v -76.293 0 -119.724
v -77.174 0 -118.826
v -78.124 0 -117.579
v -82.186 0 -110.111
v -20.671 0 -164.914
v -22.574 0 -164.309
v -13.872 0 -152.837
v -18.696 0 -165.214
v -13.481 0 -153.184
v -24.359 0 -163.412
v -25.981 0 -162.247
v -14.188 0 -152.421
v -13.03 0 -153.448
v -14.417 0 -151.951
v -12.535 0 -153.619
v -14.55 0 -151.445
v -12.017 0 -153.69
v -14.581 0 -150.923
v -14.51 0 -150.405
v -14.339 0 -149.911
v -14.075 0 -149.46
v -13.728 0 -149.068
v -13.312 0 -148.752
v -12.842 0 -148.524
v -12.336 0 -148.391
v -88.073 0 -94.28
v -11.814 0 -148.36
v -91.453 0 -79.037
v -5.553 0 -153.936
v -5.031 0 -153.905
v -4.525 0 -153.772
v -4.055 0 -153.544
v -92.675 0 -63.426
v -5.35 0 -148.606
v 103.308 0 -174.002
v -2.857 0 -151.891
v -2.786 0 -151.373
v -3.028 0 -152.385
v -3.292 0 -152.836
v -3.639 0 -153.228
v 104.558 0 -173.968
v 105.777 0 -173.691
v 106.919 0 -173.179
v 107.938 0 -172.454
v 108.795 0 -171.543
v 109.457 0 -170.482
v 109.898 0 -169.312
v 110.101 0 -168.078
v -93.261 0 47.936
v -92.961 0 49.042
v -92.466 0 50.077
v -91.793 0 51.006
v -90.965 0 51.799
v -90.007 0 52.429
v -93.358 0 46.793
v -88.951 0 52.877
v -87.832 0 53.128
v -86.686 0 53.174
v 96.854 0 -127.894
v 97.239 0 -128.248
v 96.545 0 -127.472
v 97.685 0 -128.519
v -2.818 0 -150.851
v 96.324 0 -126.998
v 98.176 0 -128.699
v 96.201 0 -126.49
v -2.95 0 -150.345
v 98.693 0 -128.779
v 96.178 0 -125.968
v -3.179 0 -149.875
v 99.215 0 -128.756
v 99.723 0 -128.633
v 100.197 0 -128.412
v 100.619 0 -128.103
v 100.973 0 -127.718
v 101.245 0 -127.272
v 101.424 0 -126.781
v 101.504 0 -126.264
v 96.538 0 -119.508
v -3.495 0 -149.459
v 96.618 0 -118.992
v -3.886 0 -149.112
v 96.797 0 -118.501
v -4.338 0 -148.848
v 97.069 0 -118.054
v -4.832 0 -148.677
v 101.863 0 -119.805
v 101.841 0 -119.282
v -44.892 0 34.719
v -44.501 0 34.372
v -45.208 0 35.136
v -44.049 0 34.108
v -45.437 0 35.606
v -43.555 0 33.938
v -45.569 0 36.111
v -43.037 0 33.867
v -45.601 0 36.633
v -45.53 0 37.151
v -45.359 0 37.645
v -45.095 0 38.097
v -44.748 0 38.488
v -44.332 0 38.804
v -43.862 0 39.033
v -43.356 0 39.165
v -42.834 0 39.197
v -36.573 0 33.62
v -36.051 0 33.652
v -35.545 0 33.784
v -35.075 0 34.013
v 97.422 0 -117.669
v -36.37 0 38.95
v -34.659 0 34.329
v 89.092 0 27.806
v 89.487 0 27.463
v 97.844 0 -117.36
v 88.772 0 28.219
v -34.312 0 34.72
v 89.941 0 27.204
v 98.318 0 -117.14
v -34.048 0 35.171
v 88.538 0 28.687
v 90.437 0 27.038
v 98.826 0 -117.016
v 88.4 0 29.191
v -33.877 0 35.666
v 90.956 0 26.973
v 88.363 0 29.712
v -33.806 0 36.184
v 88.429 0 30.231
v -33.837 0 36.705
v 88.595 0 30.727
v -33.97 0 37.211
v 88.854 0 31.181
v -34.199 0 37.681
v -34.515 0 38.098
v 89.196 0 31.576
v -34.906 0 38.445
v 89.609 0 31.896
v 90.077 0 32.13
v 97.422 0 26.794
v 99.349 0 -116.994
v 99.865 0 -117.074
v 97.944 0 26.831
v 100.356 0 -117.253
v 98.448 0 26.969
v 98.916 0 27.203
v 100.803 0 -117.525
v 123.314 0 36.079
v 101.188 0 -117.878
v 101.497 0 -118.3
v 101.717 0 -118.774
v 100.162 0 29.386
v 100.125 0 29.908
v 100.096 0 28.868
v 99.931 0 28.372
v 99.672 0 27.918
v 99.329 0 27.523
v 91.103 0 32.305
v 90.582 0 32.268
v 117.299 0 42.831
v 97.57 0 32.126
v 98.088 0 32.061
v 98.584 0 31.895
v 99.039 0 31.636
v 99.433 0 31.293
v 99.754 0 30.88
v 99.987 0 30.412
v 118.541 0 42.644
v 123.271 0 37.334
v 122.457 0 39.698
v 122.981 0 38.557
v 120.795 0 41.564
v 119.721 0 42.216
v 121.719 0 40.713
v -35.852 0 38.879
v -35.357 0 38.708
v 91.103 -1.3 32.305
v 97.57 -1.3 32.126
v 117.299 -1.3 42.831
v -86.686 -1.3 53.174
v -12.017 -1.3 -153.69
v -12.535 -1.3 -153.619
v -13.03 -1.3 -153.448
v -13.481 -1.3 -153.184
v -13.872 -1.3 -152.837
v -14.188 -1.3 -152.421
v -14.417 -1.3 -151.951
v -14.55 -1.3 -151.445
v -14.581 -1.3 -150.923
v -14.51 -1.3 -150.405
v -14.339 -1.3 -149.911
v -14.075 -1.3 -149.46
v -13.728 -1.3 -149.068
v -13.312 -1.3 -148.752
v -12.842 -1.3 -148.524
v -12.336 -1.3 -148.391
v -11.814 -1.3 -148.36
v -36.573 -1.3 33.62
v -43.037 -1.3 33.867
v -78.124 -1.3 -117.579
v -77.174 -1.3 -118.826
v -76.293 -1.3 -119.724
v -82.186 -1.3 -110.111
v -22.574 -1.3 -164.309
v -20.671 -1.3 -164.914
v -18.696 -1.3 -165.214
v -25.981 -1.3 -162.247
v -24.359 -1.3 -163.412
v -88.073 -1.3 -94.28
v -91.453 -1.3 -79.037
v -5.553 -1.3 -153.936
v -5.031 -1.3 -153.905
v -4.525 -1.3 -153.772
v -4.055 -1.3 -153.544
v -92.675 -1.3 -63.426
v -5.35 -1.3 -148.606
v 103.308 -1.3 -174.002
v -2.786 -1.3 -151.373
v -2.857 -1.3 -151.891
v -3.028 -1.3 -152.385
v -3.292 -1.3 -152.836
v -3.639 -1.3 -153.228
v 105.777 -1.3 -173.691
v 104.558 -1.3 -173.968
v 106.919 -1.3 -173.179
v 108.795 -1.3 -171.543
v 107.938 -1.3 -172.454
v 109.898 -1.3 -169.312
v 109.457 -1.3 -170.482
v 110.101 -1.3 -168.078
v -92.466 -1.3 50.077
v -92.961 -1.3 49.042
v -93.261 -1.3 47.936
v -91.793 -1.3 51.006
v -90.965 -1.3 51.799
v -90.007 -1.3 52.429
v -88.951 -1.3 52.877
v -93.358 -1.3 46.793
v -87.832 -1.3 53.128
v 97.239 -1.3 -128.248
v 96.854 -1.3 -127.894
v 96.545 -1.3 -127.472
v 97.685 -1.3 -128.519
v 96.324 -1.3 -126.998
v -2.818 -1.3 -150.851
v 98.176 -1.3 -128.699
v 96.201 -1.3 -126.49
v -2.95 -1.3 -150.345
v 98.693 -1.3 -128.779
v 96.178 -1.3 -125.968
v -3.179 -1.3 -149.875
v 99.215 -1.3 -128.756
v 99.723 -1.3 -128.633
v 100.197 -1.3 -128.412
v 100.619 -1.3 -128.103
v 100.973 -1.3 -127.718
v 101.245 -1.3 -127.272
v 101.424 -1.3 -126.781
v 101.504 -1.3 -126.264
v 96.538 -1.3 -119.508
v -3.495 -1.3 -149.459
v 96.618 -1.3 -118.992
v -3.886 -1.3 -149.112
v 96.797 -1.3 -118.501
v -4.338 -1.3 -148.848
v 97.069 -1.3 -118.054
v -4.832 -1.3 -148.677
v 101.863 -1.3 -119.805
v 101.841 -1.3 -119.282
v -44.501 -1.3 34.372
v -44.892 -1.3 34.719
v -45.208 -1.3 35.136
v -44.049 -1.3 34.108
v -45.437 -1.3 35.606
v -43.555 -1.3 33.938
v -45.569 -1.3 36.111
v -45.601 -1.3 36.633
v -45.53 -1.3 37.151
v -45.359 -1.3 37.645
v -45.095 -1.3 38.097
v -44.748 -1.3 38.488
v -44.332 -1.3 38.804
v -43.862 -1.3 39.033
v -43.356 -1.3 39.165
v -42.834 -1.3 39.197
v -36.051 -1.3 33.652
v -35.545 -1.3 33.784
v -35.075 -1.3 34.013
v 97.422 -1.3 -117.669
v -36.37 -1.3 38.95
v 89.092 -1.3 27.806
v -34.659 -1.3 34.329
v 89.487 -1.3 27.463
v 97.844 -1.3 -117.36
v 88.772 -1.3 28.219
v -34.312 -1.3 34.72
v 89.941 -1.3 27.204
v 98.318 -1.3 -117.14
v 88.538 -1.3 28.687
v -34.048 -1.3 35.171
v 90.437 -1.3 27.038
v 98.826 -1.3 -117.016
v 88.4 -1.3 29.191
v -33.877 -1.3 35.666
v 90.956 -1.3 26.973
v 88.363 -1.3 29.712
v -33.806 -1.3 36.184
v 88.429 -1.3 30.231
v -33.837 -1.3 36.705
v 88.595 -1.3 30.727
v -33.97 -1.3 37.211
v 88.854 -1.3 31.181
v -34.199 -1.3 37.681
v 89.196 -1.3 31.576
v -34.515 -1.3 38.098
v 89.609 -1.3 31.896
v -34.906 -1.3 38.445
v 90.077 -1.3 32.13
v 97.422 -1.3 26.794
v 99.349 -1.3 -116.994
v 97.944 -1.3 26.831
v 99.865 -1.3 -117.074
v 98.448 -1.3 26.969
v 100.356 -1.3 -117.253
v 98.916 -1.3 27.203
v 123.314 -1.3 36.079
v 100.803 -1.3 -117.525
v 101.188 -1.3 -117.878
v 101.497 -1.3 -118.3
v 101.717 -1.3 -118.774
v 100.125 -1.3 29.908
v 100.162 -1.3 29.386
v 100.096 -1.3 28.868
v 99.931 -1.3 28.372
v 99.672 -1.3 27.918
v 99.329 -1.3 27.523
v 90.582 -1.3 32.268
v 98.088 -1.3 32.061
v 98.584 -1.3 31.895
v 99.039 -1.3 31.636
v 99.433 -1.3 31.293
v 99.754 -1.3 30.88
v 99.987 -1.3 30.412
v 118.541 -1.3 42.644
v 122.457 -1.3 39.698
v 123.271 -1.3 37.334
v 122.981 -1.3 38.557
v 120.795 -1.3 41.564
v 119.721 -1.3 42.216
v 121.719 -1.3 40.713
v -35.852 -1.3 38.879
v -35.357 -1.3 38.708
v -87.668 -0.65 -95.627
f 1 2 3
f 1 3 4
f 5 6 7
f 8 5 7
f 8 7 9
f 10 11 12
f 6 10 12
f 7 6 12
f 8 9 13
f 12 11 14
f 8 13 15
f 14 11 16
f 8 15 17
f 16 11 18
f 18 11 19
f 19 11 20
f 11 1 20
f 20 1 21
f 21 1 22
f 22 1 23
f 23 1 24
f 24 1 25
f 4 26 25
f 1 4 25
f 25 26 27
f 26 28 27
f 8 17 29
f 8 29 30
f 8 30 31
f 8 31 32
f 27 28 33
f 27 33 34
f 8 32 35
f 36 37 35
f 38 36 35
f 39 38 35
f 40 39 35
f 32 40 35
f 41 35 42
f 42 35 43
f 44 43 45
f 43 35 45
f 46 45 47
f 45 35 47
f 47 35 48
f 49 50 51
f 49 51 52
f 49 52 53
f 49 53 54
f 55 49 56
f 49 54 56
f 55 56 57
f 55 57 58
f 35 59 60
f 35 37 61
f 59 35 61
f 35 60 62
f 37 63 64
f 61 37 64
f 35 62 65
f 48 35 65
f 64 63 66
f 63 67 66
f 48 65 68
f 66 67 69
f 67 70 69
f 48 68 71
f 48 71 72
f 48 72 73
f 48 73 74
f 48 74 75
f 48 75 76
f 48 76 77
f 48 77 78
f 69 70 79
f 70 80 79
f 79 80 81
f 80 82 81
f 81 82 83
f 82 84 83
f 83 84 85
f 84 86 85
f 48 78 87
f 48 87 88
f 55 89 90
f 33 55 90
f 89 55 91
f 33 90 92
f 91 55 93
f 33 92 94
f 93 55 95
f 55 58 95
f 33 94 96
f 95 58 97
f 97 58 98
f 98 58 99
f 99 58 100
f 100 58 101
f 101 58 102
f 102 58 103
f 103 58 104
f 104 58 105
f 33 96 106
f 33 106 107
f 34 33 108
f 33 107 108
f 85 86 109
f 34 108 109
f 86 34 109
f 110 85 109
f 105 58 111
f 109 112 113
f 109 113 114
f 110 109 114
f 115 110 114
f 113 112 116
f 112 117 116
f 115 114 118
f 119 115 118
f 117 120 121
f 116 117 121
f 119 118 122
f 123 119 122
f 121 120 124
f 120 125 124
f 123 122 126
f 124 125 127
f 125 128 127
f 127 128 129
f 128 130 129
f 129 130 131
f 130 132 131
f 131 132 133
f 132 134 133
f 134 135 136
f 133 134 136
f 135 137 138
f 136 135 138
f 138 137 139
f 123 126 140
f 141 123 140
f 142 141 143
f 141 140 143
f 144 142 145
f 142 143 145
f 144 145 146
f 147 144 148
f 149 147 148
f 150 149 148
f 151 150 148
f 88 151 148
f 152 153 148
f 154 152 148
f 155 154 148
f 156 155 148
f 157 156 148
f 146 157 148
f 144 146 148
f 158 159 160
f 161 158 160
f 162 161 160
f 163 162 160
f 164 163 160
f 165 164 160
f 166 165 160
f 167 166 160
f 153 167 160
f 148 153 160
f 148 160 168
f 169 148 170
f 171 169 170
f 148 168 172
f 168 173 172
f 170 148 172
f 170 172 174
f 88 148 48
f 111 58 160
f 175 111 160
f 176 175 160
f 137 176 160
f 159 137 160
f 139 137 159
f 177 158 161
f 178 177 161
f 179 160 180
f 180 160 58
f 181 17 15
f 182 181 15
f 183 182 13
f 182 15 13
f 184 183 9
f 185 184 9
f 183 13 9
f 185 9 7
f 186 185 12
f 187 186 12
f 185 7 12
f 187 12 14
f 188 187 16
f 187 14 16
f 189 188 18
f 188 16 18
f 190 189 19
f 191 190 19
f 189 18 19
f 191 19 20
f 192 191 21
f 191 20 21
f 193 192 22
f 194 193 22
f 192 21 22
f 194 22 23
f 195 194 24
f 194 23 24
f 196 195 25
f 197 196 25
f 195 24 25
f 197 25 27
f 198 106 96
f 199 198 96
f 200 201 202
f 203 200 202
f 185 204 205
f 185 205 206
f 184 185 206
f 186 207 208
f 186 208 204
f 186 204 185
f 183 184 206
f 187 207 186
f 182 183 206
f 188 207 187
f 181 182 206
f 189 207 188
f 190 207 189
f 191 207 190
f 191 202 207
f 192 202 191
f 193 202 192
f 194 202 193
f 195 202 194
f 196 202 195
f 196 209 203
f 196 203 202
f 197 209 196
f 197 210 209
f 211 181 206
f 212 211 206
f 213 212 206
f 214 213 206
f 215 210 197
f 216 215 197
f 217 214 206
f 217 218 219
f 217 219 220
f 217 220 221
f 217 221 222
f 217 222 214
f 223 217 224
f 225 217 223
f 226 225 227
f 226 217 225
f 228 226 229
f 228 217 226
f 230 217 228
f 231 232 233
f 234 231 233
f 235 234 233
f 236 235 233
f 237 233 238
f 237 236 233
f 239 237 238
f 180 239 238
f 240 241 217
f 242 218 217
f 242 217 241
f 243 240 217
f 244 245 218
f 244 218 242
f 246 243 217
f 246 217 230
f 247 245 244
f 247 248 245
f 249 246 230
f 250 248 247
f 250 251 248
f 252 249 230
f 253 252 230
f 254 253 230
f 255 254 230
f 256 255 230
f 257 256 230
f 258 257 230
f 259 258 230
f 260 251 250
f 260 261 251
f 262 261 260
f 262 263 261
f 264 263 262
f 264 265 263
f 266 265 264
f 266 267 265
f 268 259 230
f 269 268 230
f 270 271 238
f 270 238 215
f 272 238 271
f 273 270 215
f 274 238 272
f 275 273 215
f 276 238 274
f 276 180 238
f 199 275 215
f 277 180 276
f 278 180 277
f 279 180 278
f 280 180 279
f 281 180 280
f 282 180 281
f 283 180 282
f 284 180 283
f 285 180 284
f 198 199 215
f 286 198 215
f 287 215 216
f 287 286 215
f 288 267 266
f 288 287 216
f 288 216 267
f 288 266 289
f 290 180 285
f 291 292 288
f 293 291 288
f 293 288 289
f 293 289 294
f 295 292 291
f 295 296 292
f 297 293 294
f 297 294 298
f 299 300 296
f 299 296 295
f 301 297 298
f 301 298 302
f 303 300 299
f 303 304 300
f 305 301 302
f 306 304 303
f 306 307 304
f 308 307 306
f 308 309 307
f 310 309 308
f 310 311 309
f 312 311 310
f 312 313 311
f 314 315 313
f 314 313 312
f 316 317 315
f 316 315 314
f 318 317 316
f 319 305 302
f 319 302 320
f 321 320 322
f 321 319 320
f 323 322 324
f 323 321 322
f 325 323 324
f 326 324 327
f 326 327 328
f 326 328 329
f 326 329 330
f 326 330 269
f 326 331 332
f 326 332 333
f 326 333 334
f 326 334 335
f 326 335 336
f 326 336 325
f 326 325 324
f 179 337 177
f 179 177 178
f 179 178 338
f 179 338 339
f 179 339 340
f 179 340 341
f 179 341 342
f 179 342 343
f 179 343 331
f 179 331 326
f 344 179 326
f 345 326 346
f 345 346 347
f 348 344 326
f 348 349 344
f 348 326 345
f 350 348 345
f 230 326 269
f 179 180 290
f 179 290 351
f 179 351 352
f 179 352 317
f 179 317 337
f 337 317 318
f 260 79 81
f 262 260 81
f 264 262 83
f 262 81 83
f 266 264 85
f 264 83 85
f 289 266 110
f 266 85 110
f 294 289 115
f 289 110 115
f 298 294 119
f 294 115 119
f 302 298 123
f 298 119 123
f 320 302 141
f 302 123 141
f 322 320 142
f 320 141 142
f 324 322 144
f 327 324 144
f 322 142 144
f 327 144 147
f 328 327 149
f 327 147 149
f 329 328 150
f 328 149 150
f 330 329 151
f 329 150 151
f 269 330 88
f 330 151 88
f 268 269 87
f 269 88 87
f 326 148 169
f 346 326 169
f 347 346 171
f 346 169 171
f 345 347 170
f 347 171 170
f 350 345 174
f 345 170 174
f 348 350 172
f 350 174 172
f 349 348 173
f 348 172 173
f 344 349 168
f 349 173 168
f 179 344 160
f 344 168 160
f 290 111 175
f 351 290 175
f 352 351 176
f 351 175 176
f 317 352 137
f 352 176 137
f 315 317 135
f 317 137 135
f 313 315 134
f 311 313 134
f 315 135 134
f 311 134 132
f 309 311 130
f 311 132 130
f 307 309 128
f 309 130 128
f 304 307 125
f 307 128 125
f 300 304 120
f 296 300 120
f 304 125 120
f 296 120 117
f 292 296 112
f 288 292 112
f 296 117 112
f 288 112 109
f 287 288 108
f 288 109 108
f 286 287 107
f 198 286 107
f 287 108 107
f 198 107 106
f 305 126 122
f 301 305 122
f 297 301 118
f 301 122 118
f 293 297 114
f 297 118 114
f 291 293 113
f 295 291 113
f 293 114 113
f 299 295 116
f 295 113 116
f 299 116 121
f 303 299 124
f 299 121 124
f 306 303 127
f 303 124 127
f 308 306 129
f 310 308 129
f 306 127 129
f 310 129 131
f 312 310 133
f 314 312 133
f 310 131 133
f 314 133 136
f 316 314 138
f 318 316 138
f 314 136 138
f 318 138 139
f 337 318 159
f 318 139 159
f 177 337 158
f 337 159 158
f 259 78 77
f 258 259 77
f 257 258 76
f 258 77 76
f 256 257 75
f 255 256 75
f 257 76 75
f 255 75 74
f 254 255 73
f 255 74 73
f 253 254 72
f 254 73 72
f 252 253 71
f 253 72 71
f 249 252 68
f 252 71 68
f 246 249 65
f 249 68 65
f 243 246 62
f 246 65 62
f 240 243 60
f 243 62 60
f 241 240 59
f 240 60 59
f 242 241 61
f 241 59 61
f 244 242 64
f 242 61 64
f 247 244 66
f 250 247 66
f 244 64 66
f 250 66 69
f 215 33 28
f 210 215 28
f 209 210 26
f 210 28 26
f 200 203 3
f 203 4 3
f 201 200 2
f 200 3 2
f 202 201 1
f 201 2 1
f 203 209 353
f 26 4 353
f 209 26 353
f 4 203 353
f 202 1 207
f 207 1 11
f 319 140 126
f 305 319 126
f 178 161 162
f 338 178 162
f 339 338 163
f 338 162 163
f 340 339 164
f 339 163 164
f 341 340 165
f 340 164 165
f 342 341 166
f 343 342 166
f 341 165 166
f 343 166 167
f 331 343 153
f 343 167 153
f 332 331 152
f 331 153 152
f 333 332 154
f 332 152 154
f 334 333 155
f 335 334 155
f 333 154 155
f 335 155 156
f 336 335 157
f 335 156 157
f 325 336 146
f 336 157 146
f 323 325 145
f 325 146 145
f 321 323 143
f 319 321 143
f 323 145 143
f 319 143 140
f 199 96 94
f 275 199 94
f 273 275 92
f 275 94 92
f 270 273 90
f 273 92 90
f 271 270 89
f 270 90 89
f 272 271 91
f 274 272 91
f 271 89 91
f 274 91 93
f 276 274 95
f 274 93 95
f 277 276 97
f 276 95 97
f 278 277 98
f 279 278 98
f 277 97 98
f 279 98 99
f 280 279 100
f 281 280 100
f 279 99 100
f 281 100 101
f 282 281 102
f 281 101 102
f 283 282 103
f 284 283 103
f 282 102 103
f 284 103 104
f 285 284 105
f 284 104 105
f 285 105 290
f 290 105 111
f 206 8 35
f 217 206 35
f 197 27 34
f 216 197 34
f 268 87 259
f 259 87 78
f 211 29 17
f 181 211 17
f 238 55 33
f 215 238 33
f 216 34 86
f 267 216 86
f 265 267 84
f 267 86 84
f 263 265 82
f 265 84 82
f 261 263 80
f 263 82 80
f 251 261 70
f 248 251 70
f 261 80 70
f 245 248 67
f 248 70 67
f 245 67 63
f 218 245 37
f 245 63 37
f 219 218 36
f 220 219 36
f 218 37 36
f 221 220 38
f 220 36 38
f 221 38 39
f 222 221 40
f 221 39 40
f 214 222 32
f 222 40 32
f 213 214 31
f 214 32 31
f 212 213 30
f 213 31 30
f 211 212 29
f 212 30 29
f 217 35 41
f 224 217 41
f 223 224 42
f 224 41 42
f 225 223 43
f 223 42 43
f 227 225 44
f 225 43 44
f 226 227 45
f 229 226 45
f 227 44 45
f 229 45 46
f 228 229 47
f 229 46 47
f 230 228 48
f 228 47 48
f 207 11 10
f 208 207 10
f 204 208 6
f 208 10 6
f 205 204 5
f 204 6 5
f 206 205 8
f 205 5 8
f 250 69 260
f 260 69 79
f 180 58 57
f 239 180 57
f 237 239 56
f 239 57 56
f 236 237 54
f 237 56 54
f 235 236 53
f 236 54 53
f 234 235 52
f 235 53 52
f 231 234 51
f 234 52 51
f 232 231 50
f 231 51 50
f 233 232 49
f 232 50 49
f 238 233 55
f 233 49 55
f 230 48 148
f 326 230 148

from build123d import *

# Parameters (mm, degrees)
F1_DEPTH = 1.3


with BuildPart() as f1:
    # F0 (on Front) → F1 (new body)
    with BuildSketch(Plane.XZ):
        with BuildLine():
            ThreePointArc((103.3079727003, -174.0017143415), (107.9375486889, -172.4540817784), (110.1009118369, -168.0782389711))
            Line((110.1009118369, -168.0782389711), (123.3140694013, 36.0793576773))
            ThreePointArc((123.3140694013, 36.0793576773), (121.7186870706, 40.7134537603), (117.2988791147, 42.8313274396))
            Line((117.2988791147, 42.8313274396), (-86.6861012737, 53.1740147545))
            ThreePointArc((-86.6861012737, 53.1740147545), (-91.3968478399, 51.4210035289), (-93.3575316623, 46.7928396902))
            Line((-93.3575316623, 46.7928396902), (-92.6750005064, -63.4259672216))
            add(Edge.make_bspline(
                [(-92.6750005064, -63.4259672216), (-92.6146745207, -73.1677322968), (-89.962188232, -93.9434810925), (-79.4723870211, -117.0371161404), (-76.2930011516, -119.7242526752)],
                knots=[0, 0, 0, 0, 0.5251404871, 1, 1, 1, 1], degree=3))
            Line((-76.2930011516, -119.7242526752), (-25.9811858827, -162.2465266281))
            ThreePointArc((-25.9811858827, -162.2465266281), (-22.5739765007, -164.3085989306), (-18.6956488116, -165.2140227485))
            Line((-18.6956488116, -165.2140227485), (103.3079727003, -174.0017143415))
        make_face()
        with BuildLine():
            ThreePointArc((-12.0174558833, -153.6898314953), (-14.5808883162, -150.9231381327), (-11.8141949536, -148.3597056999))
            Line((-11.8141949536, -148.3597056999), (-5.3496916575, -148.6062253883))
            ThreePointArc((-5.3496916575, -148.6062253883), (-2.7862592246, -151.3729187508), (-5.5529525872, -153.9363511837))
            Line((-5.5529525872, -153.9363511837), (-12.0174558833, -153.6898314953))
        make_face(mode=Mode.SUBTRACT)
        with BuildLine():
            ThreePointArc((101.5041172504, -126.2639015913), (98.693107204, -128.7786581439), (96.1783506514, -125.9676480975))
            Line((96.1783506514, -125.9676480975), (96.5376539326, -119.5084317383))
            ThreePointArc((96.5376539326, -119.5084317383), (99.348663979, -116.9936751857), (101.8634205316, -119.8046852321))
            Line((101.8634205316, -119.8046852321), (101.5041172504, -126.2639015913))
        make_face(mode=Mode.SUBTRACT)
        with BuildLine():
            ThreePointArc((-43.0372696765, 33.8666485342), (-45.6007021093, 36.6333418967), (-42.8340087468, 39.1967743295))
            Line((-42.8340087468, 39.1967743295), (-36.3695054507, 38.9502546412))
            ThreePointArc((-36.3695054507, 38.9502546412), (-33.8060730178, 36.1835612786), (-36.5727663804, 33.6201288458))
            Line((-36.5727663804, 33.6201288458), (-43.0372696765, 33.8666485342))
        make_face(mode=Mode.SUBTRACT)
        with BuildLine():
            ThreePointArc((90.9557119012, 26.9728396088), (88.3633950976, 29.7124876865), (91.1030431753, 32.3048044901))
            Line((91.1030431753, 32.3048044901), (97.5697769586, 32.1261176179))
            ThreePointArc((97.5697769586, 32.1261176179), (100.1620937622, 29.3864695402), (97.4224456845, 26.7941527365))
            Line((97.4224456845, 26.7941527365), (90.9557119012, 26.9728396088))
        make_face(mode=Mode.SUBTRACT)
    extrude(amount=F1_DEPTH)


solid = f1.part
